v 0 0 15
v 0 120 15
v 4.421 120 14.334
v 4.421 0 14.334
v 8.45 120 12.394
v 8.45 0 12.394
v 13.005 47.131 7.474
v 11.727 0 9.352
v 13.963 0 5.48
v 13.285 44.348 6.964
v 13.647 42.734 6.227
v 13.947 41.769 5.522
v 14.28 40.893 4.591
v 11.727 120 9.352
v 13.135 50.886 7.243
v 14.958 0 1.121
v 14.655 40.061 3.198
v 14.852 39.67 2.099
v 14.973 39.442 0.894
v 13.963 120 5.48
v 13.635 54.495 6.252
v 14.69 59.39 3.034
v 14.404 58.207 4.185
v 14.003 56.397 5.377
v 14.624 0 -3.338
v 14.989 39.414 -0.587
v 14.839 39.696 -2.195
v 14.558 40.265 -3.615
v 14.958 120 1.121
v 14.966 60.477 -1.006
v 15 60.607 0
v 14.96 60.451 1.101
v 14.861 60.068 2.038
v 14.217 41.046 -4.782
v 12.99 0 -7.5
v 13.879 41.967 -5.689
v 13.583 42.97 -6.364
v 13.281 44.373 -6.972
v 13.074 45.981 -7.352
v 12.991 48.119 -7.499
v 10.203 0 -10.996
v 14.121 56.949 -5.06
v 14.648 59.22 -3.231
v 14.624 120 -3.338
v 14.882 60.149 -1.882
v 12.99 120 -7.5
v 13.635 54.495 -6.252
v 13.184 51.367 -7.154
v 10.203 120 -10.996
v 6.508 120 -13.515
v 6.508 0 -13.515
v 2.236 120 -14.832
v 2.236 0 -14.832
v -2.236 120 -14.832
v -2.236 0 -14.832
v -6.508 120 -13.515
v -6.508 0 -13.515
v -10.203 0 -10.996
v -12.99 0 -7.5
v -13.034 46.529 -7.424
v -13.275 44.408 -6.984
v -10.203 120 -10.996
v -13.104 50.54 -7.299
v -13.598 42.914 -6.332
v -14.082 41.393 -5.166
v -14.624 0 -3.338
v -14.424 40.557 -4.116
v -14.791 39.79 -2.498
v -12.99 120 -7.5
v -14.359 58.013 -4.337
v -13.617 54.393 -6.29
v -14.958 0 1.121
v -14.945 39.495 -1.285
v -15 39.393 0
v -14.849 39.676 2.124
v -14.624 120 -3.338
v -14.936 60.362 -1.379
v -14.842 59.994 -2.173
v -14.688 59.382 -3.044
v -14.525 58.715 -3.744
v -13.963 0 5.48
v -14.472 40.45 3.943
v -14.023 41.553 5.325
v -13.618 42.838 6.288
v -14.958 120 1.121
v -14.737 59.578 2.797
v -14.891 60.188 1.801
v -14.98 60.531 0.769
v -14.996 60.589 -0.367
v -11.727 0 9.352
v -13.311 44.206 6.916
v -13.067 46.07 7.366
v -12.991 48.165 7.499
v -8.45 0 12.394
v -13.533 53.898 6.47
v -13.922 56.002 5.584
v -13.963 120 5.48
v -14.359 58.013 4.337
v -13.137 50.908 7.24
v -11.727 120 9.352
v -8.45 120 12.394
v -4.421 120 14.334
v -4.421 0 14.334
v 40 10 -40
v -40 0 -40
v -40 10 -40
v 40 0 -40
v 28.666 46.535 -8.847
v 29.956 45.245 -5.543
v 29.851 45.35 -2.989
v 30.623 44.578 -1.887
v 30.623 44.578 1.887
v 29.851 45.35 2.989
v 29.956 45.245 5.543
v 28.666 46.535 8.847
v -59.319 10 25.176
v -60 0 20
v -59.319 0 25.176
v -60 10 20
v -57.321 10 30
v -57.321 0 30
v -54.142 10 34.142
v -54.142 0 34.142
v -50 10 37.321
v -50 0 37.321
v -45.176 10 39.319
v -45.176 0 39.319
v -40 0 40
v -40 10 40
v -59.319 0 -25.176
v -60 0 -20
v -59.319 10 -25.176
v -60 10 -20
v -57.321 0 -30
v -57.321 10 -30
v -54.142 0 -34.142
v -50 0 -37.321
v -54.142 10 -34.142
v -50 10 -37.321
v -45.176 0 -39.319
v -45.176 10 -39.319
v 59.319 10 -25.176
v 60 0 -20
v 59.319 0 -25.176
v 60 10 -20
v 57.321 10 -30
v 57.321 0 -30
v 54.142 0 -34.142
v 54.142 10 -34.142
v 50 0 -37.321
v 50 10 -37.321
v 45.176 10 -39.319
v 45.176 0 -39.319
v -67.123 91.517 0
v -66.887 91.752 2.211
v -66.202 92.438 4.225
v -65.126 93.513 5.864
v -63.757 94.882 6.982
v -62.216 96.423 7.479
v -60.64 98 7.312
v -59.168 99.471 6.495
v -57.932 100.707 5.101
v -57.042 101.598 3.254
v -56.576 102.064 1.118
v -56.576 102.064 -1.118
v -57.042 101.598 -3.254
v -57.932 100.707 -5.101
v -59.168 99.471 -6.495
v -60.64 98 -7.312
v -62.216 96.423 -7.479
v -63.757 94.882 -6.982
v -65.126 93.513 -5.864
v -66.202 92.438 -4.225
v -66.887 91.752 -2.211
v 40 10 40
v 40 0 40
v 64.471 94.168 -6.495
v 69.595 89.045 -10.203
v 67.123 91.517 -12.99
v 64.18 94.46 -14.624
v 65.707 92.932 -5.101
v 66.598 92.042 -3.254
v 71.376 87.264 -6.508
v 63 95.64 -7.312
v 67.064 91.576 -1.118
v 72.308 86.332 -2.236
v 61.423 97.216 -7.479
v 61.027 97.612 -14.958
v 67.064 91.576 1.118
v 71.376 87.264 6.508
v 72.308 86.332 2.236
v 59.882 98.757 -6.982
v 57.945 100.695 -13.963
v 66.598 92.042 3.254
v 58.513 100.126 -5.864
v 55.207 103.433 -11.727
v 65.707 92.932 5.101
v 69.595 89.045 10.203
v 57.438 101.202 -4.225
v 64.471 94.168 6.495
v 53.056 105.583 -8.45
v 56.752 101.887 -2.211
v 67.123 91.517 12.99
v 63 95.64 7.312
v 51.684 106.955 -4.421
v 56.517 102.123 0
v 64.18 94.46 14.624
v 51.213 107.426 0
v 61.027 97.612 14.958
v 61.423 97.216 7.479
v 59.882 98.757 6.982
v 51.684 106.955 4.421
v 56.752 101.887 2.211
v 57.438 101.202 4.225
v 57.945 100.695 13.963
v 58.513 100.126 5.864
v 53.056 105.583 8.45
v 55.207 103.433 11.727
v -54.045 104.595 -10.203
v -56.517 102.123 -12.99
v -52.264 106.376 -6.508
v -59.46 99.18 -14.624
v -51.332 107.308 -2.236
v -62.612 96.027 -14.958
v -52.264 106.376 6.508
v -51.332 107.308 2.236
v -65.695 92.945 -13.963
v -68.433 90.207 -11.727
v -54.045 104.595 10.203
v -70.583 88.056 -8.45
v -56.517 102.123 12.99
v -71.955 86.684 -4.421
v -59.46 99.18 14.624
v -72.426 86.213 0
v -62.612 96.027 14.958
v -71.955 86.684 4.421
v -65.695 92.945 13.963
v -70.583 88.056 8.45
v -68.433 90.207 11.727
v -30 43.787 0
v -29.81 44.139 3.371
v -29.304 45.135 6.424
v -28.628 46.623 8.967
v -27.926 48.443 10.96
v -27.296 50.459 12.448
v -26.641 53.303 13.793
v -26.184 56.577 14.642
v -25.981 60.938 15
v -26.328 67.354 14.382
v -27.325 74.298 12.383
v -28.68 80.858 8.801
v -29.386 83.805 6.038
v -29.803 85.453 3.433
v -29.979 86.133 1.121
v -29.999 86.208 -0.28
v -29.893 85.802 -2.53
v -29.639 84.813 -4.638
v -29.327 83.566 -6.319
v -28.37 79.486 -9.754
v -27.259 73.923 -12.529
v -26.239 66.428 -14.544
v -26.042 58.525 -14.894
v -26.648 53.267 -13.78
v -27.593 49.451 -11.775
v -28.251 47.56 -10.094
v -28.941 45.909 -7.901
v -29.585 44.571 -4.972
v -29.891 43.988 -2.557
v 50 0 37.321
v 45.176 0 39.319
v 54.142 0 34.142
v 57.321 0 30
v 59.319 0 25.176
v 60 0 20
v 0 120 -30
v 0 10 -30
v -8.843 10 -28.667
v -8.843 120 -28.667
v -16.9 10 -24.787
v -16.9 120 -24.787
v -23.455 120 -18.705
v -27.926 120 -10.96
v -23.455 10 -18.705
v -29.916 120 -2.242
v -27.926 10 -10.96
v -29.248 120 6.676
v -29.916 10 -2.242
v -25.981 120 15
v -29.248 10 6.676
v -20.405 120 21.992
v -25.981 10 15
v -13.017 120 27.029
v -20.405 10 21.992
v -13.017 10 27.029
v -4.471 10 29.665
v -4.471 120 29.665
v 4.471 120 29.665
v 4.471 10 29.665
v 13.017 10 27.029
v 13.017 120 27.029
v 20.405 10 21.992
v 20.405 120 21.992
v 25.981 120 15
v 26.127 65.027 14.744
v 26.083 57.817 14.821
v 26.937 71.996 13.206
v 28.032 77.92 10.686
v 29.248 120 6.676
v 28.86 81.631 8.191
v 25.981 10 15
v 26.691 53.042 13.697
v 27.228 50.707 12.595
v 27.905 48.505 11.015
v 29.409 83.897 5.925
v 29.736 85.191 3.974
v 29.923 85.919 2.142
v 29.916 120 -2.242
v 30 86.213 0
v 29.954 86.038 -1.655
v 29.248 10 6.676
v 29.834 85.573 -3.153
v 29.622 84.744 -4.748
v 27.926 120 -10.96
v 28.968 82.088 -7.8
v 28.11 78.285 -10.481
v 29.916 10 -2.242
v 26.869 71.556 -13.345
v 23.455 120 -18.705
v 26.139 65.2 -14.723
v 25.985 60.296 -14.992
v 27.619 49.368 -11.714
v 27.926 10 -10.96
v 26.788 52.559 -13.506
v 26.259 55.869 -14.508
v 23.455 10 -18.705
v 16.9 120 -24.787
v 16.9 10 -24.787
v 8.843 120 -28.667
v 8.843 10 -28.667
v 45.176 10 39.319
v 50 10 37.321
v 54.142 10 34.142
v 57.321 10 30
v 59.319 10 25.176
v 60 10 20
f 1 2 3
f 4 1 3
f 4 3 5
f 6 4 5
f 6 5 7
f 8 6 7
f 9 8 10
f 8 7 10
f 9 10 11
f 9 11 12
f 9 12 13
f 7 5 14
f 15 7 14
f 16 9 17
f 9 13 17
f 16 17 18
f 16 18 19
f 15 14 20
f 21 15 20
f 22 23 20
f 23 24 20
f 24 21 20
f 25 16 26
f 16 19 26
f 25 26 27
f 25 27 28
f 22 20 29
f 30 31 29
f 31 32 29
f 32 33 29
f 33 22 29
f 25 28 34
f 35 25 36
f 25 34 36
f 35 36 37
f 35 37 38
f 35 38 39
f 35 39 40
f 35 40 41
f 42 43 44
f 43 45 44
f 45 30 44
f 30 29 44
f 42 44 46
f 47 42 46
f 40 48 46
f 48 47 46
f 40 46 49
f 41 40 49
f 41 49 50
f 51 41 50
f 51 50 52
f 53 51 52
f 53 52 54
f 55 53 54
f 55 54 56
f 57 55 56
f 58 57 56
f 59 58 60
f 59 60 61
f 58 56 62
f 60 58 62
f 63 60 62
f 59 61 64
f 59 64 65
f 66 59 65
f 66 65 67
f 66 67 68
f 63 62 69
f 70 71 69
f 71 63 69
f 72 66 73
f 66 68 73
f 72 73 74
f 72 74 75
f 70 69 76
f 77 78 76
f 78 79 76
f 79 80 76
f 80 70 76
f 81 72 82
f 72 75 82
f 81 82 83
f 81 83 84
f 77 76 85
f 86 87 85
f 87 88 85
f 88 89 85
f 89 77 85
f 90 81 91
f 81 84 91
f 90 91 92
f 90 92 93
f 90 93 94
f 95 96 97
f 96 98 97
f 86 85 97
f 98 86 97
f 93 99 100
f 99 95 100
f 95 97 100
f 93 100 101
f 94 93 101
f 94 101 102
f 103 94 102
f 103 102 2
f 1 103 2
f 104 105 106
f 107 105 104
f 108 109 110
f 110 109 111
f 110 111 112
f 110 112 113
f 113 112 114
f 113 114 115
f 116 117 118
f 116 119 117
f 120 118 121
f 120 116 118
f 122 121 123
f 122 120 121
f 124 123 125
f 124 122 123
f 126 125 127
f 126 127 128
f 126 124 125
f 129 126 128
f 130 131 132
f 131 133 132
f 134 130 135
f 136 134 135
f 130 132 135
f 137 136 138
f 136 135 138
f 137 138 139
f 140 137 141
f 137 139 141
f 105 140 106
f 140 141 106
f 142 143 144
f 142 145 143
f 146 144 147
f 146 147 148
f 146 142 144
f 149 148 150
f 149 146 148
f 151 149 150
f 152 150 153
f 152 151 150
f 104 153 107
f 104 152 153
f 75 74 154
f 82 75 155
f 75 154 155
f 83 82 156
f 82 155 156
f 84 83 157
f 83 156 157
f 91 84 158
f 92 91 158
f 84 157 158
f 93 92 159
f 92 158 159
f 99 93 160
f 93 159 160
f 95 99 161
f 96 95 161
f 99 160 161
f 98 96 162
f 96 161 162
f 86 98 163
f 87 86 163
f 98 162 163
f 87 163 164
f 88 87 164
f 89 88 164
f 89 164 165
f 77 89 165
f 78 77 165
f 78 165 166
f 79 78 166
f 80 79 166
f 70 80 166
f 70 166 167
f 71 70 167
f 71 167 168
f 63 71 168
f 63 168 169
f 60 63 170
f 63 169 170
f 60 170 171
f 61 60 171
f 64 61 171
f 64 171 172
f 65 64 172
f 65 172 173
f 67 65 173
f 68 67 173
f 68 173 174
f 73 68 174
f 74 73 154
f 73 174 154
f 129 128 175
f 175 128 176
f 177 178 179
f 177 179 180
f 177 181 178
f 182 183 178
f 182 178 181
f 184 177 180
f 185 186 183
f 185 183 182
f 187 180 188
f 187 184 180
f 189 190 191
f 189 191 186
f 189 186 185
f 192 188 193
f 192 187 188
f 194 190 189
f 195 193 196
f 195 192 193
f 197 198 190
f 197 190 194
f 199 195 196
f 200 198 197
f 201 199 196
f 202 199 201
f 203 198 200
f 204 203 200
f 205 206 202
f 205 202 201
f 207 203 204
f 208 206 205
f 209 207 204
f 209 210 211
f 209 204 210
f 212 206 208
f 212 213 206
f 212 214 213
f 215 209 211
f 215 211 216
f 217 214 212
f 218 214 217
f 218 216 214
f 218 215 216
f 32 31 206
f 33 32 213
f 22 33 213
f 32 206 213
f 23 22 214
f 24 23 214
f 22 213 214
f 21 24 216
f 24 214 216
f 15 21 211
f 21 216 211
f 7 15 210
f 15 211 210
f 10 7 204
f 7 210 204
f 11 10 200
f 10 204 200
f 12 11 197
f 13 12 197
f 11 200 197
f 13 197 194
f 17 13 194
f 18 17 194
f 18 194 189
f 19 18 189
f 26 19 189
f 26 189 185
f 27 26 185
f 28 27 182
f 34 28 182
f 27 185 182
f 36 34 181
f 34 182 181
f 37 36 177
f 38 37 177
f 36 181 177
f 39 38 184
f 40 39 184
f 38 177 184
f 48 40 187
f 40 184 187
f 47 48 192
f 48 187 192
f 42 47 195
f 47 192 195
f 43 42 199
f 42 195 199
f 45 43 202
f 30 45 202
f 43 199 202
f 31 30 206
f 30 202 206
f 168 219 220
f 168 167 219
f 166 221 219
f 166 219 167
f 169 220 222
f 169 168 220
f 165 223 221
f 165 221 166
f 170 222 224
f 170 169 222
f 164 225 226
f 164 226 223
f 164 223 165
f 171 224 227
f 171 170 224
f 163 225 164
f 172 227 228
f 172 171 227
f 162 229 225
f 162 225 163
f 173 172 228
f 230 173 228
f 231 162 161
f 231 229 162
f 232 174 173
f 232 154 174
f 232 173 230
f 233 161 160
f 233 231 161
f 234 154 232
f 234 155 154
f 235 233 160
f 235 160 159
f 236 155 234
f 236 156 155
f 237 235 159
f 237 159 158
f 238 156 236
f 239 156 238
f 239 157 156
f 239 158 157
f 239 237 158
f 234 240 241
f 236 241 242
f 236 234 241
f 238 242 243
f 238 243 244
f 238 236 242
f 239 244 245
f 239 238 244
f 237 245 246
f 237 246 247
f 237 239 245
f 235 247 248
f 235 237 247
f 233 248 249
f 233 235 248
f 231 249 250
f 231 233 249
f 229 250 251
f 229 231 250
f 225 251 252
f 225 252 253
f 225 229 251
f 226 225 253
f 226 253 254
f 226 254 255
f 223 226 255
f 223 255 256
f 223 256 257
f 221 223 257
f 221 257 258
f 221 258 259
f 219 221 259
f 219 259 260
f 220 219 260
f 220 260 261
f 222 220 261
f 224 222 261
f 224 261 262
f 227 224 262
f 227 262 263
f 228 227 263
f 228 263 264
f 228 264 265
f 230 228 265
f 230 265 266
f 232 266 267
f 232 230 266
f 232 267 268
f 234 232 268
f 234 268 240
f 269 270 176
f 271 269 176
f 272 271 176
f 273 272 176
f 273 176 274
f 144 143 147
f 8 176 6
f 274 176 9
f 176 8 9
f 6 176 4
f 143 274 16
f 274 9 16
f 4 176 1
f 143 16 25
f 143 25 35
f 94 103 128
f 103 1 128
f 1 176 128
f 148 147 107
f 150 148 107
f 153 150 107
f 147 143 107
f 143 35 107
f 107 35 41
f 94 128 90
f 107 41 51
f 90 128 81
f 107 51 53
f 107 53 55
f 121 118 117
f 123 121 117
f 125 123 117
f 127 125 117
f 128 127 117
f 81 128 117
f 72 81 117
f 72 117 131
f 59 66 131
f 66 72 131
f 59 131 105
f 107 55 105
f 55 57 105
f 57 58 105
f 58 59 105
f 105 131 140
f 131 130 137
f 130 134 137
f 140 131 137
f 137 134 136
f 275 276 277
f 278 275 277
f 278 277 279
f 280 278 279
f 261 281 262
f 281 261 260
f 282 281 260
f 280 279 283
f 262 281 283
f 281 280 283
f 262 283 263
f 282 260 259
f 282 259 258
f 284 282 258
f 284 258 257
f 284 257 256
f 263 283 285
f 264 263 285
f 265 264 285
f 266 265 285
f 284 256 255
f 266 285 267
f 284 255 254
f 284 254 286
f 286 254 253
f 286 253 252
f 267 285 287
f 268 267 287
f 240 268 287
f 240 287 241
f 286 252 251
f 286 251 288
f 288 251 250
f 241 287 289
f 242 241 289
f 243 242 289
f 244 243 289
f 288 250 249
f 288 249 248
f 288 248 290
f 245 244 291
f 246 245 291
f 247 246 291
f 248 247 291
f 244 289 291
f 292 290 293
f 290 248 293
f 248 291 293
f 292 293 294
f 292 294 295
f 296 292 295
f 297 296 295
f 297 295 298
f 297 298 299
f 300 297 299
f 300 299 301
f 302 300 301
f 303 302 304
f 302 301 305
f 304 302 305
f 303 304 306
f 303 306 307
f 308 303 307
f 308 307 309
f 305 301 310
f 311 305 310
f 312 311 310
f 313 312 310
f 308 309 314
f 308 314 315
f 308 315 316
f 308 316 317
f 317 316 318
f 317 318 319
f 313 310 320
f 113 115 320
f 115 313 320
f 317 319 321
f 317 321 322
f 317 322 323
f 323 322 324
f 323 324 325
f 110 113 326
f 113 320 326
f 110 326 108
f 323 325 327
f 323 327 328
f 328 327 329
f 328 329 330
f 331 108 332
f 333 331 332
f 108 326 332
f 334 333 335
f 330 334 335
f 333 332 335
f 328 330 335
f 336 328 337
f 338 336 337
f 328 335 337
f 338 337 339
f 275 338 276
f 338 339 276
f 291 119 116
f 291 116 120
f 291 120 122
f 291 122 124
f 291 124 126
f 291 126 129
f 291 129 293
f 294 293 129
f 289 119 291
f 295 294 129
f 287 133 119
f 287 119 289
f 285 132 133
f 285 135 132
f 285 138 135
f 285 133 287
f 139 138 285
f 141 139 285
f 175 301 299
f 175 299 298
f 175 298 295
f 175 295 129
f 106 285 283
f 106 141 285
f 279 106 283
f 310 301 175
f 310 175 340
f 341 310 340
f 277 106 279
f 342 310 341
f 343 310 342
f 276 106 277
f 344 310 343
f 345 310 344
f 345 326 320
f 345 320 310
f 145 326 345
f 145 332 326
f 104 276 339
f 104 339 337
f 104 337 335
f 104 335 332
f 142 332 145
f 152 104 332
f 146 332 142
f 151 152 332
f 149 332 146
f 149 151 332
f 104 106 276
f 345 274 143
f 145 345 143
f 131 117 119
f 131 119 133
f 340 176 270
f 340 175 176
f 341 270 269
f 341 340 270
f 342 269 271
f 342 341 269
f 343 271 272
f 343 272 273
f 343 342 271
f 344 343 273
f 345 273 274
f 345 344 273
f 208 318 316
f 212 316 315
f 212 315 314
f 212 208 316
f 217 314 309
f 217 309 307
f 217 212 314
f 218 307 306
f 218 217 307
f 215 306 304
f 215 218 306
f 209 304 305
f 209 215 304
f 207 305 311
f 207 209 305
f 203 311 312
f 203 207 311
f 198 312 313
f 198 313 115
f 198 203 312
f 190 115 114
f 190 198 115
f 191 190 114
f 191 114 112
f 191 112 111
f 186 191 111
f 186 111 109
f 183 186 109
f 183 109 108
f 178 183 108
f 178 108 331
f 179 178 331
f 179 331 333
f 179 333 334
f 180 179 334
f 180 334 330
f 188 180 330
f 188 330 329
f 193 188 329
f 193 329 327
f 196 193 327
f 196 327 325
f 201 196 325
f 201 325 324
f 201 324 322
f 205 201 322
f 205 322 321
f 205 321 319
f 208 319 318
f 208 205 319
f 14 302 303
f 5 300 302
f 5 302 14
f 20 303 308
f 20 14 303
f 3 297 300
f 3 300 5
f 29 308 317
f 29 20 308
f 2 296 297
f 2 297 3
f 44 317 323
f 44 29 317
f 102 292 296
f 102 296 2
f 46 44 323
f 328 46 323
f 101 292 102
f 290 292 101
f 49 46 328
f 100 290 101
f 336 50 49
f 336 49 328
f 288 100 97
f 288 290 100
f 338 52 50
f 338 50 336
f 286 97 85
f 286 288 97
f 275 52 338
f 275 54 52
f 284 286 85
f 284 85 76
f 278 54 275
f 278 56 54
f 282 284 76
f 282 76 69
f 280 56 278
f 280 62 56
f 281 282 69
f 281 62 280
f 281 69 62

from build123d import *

# Parameters (mm, degrees)
CROQUIS1_W              = 120
CROQUIS1_H              = 80
SALIENTE_EXTRUIR1_DEPTH = 10
REDONDEO1_R             = 20
CROQUIS2_R              = 30
SALIENTE_EXTRUIR3_DEPTH = 120
CROQUIS6_R              = 15
SALIENTE_EXTRUIR4_DEPTH = 59
CROQUIS7_R              = 7.5
CORTAR_EXTRUIR1_DEPTH   = 64
CROQUIS8_R              = 15
CORTAR_EXTRUIR2_DEPTH   = 150
CROQUIS9_R              = 7.5
CORTAR_EXTRUIR3_DEPTH   = 83
CROQUIS10_R             = 15
SALIENTE_EXTRUIR5_DEPTH = 61
CROQUIS11_R             = 7.5
CORTAR_EXTRUIR4_DEPTH   = 78
CROQUIS12_R             = 15
CORTAR_EXTRUIR5_DEPTH   = 134


with BuildPart() as part:
    # Croquis1 → Saliente-Extruir1 (new body)
    with BuildSketch(Plane(origin=(0, 0, 0), x_dir=(1, 0, 0), z_dir=(0, 1, 0))):
        Rectangle(CROQUIS1_W, CROQUIS1_H)
    extrude(amount=SALIENTE_EXTRUIR1_DEPTH)

    # Redondeo1
    redondeo1_edges = [part.edges().sort_by_distance(p)[0] for p in [
        (60, 5, 40),
        (-60, 5, 40),
        (-60, 5, -40),
        (60, 5, -40),
    ]]
    fillet(redondeo1_edges, radius=REDONDEO1_R)

    # Croquis2 → Saliente-Extruir3 (add)
    with BuildSketch(Plane(origin=(0, 0, 0), x_dir=(1, 0, 0), z_dir=(0, 1, 0))):
        with Locations(Location((0, 0, 0), (0, 0, 90))):
            Circle(CROQUIS2_R)
    extrude(amount=SALIENTE_EXTRUIR3_DEPTH)

    # Croquis6 → Saliente-Extruir4 (add)
    with BuildSketch(Plane(origin=(79.319805153, 79.319805153, 0), x_dir=(0, 0, -1), z_dir=(0.7071067811865487, 0.7071067811865464, 0))):
        with Locations(Location((0, 24.748737342, 0), (0, 0, 90))):
            Circle(CROQUIS6_R)
    extrude(amount=-SALIENTE_EXTRUIR4_DEPTH)

    # Croquis7 → Cortar-Extruir1 (cut)
    with BuildSketch(Plane(origin=(79.319805153, 79.319805153, 0), x_dir=(0, 0, -1), z_dir=(0.7071067811865487, 0.7071067811865464, 0))):
        with Locations(Location((0, 24.748737342, 0), (0, 0, 90))):
            Circle(CROQUIS7_R)
    extrude(amount=-CORTAR_EXTRUIR1_DEPTH, mode=Mode.SUBTRACT)

    # Croquis8 → Cortar-Extruir2 (cut)
    with BuildSketch(Plane(origin=(0, 120, 0), x_dir=(1, 0, 0), z_dir=(0, 1, 0))):
        with Locations(Location((0, 0, 0), (0, 0, 270))):
            Circle(CROQUIS8_R)
    extrude(amount=-CORTAR_EXTRUIR2_DEPTH, mode=Mode.SUBTRACT)

    # Croquis9 → Cortar-Extruir3 (cut)
    with BuildSketch(Plane(origin=(79.319805153, 79.319805153, 0), x_dir=(0, 0, -1), z_dir=(0.7071067811865487, 0.7071067811865464, 0))):
        with Locations(Location((0, 24.748737342, 0), (0, 0, 90))):
            Circle(CROQUIS9_R)
    extrude(amount=-CORTAR_EXTRUIR3_DEPTH, mode=Mode.SUBTRACT)

    # Croquis10 → Saliente-Extruir5 (add)
    with BuildSketch(Plane(origin=(-79.319805153, 79.319805153, 0), x_dir=(0.7071067811865477, 0.7071067811865475, 0), z_dir=(-0.7071067811865475, 0.7071067811865477, 0))):
        with Locations(Location((24.748737342, 0, 0), (0, 0, 180))):
            Circle(CROQUIS10_R)
    extrude(amount=-SALIENTE_EXTRUIR5_DEPTH)

    # Croquis11 → Cortar-Extruir4 (cut)
    with BuildSketch(Plane(origin=(-79.319805153, 79.319805153, 0), x_dir=(0.7071067811865477, 0.7071067811865475, 0), z_dir=(-0.7071067811865475, 0.7071067811865477, 0))):
        with Locations(Location((24.748737342, 0, 0), (0, 0, 180))):
            Circle(CROQUIS11_R)
    extrude(amount=-CORTAR_EXTRUIR4_DEPTH, mode=Mode.SUBTRACT)

    # Croquis12 → Cortar-Extruir5 (cut)
    with BuildSketch(Plane(origin=(0, 120, 0), x_dir=(1, 0, 0), z_dir=(0, 1, 0))):
        with Locations(Location((0, 0, 0), (0, 0, 270))):
            Circle(CROQUIS12_R)
    extrude(amount=-CORTAR_EXTRUIR5_DEPTH, mode=Mode.SUBTRACT)


solid = part.part
